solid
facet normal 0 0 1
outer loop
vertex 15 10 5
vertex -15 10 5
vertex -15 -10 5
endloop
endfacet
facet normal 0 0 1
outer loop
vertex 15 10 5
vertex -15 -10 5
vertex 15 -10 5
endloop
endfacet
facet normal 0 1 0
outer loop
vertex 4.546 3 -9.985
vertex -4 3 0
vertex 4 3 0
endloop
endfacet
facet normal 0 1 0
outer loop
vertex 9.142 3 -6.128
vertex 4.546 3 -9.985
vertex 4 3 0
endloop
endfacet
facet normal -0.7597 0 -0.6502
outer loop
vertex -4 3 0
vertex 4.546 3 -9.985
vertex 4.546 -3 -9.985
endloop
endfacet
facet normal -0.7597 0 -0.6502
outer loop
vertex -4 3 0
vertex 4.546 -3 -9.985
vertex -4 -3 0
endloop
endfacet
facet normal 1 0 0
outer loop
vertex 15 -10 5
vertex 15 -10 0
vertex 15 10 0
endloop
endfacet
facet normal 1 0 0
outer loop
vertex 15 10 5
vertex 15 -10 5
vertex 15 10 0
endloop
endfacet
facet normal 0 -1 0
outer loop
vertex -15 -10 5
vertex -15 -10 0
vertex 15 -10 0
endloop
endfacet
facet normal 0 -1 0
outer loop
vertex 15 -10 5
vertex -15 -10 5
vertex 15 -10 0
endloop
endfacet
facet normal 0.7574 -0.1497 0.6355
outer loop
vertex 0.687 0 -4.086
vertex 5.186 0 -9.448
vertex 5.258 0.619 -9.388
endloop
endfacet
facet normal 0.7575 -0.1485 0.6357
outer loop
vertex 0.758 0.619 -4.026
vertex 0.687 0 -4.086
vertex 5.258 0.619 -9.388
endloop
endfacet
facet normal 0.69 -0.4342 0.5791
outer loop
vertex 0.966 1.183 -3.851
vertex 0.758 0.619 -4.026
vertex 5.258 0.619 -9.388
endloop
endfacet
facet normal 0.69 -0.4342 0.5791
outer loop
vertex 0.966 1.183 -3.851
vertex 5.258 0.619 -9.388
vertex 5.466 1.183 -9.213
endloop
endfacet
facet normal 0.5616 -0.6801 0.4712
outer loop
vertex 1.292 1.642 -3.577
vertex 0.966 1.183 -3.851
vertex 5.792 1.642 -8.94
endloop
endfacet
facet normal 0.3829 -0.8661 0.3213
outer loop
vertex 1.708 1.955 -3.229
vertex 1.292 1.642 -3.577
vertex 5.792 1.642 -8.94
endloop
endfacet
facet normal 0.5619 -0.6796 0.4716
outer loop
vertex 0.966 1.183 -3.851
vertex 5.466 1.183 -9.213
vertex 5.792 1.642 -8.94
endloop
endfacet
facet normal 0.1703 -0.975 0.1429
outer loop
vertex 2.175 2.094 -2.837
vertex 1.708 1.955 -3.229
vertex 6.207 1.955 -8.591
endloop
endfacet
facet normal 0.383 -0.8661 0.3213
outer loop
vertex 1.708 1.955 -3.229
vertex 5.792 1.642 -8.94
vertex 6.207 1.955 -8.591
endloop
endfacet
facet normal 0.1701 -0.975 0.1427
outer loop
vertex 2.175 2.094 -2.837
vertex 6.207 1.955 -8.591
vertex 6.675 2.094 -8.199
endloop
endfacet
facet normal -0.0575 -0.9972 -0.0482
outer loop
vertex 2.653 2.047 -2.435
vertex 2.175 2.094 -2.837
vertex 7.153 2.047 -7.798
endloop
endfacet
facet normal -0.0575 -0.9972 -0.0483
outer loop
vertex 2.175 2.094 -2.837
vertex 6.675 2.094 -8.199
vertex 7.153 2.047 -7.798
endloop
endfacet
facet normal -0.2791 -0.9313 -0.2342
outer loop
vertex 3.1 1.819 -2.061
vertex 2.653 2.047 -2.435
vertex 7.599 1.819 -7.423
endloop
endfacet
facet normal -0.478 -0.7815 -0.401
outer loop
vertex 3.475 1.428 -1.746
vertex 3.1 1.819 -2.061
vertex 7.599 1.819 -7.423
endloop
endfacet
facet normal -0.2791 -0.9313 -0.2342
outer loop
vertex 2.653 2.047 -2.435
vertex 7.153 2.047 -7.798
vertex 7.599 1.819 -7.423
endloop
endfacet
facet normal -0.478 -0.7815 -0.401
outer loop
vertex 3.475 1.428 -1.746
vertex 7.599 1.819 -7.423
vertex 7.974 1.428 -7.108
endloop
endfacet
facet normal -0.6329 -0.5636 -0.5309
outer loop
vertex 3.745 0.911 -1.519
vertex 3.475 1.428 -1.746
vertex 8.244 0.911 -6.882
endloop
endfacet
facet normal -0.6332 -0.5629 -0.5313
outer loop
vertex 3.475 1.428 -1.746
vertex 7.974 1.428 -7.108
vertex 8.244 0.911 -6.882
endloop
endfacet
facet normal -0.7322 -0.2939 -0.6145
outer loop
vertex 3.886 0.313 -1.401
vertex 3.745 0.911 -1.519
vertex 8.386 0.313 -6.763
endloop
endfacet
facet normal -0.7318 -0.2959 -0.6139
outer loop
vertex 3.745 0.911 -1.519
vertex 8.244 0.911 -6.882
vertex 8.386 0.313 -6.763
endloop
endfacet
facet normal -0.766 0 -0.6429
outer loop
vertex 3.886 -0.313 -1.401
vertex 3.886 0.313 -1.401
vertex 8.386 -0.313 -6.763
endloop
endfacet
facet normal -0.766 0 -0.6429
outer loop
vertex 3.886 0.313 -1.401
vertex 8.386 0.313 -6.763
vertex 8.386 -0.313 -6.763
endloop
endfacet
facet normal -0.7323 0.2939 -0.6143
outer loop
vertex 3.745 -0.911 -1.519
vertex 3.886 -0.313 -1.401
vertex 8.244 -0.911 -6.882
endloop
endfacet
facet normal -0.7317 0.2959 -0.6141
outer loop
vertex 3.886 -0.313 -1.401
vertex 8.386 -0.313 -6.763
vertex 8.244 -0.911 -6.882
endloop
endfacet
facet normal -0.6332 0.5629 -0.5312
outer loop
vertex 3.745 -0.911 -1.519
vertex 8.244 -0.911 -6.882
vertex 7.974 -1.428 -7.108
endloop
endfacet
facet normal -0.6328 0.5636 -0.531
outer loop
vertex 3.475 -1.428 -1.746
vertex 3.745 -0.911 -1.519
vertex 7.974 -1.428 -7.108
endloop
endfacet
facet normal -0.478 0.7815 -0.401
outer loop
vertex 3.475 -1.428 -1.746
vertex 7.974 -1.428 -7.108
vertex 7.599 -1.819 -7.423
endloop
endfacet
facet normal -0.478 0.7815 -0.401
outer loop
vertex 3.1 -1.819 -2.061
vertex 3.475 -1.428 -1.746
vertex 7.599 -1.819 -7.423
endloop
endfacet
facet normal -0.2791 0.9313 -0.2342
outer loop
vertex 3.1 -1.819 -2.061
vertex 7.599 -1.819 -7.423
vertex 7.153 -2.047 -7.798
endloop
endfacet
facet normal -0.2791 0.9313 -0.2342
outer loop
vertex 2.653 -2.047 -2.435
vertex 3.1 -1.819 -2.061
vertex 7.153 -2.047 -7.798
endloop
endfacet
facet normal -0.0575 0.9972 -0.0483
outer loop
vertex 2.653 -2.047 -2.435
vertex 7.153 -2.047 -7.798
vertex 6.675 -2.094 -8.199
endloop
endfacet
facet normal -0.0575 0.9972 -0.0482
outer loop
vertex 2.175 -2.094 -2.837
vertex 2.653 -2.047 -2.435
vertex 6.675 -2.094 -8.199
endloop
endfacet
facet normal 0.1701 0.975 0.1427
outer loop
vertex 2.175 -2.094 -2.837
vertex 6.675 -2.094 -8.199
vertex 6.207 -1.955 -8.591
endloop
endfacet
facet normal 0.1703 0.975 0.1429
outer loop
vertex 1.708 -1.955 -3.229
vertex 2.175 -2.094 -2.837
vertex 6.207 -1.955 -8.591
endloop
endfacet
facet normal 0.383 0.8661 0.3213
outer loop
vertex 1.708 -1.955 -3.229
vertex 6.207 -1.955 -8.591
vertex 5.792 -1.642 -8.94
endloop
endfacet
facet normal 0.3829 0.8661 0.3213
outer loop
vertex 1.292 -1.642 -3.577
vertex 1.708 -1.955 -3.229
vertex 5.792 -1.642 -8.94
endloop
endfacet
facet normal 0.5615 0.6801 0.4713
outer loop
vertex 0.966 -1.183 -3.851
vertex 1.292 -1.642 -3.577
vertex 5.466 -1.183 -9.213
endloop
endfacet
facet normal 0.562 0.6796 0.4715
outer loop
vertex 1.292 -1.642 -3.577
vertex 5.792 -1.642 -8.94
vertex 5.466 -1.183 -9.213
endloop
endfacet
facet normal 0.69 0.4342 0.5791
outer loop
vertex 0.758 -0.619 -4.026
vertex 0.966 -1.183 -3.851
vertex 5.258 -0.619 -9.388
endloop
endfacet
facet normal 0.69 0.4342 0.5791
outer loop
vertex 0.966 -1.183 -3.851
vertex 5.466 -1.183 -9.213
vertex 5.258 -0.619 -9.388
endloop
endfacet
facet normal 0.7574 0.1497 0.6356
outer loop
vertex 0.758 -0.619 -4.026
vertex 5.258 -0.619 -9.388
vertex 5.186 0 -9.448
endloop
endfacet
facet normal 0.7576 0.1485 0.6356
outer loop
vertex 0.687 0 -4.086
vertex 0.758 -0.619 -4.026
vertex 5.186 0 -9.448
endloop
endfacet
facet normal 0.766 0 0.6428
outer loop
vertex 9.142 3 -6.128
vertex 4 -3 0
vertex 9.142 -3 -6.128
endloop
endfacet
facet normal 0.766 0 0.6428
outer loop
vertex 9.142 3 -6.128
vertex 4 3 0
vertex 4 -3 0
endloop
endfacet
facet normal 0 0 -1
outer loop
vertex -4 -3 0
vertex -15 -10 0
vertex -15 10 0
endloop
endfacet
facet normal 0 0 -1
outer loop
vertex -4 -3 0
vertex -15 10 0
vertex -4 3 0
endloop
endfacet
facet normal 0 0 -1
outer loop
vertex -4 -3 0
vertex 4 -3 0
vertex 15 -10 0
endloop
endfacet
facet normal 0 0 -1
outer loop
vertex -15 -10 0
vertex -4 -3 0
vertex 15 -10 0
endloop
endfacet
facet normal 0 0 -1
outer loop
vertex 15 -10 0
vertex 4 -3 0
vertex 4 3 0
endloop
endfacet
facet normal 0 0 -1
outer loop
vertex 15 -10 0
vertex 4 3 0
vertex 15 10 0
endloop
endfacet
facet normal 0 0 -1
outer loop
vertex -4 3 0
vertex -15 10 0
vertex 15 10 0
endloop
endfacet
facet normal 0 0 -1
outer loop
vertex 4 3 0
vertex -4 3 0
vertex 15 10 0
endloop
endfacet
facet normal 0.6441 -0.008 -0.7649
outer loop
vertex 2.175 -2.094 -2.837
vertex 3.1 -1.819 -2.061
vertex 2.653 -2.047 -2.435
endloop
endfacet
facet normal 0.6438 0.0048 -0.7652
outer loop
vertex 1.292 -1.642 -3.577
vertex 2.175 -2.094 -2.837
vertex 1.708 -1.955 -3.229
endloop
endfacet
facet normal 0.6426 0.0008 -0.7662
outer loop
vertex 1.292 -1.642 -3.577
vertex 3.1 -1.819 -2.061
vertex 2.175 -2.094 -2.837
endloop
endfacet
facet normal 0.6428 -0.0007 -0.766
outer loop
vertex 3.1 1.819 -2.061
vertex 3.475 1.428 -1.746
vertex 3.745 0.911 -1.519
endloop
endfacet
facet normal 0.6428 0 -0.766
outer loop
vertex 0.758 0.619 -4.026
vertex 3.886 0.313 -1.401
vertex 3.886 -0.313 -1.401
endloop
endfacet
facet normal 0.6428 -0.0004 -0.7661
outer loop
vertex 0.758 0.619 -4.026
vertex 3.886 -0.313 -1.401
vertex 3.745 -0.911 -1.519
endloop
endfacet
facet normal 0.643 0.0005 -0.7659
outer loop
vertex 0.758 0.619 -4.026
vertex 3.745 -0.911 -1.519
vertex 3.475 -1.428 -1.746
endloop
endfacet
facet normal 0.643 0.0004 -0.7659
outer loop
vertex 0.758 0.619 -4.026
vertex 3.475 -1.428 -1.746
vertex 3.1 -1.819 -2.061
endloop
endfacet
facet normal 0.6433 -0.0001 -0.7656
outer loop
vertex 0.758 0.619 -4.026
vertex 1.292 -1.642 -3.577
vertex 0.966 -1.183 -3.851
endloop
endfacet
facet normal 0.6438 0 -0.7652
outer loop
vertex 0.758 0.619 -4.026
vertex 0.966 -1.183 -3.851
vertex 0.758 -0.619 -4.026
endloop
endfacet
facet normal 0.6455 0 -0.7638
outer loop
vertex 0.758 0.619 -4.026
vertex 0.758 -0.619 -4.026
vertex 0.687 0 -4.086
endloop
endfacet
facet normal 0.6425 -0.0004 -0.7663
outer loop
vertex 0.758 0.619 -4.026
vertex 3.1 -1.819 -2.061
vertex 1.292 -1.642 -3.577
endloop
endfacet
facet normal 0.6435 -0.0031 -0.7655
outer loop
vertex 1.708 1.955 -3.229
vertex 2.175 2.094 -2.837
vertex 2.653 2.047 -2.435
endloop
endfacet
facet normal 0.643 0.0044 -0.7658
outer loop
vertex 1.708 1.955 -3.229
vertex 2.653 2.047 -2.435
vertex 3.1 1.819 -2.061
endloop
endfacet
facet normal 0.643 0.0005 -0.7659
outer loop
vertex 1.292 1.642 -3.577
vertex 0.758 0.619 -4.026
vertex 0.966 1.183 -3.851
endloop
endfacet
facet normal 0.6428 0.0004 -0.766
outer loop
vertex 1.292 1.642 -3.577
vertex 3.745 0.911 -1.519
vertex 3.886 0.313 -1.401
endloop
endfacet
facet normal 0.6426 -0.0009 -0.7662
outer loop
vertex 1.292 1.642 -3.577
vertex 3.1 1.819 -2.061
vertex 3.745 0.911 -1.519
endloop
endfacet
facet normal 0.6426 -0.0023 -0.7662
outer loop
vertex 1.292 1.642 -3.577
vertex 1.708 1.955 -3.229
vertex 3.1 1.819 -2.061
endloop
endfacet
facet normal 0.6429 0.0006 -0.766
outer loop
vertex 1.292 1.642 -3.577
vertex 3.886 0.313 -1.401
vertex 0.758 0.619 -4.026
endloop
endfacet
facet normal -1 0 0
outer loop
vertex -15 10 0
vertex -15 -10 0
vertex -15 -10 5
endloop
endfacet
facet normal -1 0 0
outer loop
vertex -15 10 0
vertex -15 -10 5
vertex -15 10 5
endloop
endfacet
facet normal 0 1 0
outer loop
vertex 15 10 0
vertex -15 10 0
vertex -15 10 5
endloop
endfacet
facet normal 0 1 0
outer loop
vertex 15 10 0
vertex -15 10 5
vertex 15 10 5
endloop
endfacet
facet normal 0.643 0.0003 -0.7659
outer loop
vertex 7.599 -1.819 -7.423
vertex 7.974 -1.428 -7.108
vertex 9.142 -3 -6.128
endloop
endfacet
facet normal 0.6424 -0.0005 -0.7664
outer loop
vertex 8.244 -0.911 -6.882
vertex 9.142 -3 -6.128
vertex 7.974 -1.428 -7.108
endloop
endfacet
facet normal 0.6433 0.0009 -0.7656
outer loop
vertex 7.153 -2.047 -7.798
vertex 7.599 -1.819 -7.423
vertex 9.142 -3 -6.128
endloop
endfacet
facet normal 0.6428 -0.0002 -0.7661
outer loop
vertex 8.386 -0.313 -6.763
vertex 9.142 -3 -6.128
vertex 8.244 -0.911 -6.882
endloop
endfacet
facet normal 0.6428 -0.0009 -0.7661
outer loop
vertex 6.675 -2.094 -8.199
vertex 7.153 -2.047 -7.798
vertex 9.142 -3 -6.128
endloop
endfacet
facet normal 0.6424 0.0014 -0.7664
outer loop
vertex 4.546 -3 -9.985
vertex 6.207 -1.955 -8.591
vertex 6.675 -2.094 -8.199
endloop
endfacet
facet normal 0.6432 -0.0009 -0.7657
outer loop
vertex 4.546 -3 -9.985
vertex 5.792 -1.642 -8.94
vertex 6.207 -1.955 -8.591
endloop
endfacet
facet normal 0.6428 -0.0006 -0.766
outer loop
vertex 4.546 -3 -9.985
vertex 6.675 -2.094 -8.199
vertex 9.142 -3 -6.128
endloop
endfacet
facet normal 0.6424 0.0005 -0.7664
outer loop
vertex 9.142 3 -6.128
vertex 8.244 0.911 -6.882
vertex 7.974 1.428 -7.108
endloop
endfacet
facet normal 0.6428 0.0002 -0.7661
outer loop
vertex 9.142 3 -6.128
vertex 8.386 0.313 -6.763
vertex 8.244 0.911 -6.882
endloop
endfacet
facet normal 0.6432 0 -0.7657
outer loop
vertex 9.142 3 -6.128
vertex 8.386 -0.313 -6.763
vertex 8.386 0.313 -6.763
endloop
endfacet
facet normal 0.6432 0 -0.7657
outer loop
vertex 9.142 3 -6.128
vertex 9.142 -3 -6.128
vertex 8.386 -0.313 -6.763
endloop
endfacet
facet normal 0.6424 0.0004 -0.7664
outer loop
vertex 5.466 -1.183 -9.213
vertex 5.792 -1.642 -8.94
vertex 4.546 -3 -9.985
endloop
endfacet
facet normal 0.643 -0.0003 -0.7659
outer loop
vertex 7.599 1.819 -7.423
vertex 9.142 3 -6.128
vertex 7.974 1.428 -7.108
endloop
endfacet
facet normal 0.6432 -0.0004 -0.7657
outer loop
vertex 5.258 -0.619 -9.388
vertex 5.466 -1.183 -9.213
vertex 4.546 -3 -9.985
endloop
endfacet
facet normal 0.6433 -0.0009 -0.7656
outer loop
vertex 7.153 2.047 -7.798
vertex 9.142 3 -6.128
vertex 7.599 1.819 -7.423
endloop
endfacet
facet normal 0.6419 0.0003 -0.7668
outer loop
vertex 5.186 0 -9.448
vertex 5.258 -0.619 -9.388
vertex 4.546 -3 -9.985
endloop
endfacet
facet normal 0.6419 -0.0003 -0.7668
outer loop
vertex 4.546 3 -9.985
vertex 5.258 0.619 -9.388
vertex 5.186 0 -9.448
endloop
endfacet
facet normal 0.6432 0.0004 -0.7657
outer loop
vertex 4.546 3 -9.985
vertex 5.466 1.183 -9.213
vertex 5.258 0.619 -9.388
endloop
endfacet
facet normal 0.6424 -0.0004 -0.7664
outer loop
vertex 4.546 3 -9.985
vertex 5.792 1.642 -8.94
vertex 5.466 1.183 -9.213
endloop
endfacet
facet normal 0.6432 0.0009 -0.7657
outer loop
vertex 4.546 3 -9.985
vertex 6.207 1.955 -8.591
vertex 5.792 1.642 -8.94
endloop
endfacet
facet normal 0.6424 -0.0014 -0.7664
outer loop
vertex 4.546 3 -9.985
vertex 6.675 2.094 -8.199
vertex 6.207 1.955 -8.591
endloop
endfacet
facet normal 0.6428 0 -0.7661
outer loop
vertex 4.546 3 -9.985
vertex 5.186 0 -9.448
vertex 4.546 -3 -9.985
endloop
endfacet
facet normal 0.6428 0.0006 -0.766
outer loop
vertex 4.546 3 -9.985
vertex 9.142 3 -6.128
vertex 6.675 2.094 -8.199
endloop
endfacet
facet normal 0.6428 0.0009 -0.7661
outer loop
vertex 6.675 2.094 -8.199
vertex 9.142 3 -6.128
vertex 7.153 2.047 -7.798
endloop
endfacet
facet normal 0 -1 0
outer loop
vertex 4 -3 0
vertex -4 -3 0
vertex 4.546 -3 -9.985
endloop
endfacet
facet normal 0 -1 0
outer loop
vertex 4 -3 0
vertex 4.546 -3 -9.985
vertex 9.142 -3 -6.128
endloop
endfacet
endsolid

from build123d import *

# Parameters (mm, degrees)
CROQUIS1_W                   = 30
CROQUIS1_H                   = 20
SALIENTE_EXTRUIR1_DEPTH      = 5
SALIENTE_EXTRUIR2_DEPTH      = 3
SALIENTE_EXTRUIR2_DEPTH_BACK = 3
CROQUIS4_R                   = 2.1
CORTAR_EXTRUIR1_DEPTH        = 7


with BuildPart() as part:
    # Croquis1 → Saliente-Extruir1 (new body)
    with BuildSketch(Plane.XY):
        Rectangle(CROQUIS1_W, CROQUIS1_H)
    extrude(amount=SALIENTE_EXTRUIR1_DEPTH)

    # Croquis3 → Saliente-Extruir2 (add, two sides)
    with BuildSketch(Plane(origin=(0, 0, 0), x_dir=(1, 0, 0), z_dir=(0, 1, 0))) as saliente_extruir2_sk:
        Polygon((-4, 0), (4, 0), (9.142300877, 6.128355545), (4.546034219, 9.985081203), align=None)
    extrude(amount=SALIENTE_EXTRUIR2_DEPTH)
    extrude(saliente_extruir2_sk.sketch, amount=-SALIENTE_EXTRUIR2_DEPTH_BACK)

    # Croquis4 → Cortar-Extruir1 (cut)
    with BuildSketch(Plane(origin=(6.795004522, 0, -8.097971051), x_dir=(-0.766044443, 0, -0.64278761), z_dir=(0.64278761, 0, -0.766044443))):
        Circle(CROQUIS4_R)
    extrude(amount=-CORTAR_EXTRUIR1_DEPTH, mode=Mode.SUBTRACT)


solid = part.part
